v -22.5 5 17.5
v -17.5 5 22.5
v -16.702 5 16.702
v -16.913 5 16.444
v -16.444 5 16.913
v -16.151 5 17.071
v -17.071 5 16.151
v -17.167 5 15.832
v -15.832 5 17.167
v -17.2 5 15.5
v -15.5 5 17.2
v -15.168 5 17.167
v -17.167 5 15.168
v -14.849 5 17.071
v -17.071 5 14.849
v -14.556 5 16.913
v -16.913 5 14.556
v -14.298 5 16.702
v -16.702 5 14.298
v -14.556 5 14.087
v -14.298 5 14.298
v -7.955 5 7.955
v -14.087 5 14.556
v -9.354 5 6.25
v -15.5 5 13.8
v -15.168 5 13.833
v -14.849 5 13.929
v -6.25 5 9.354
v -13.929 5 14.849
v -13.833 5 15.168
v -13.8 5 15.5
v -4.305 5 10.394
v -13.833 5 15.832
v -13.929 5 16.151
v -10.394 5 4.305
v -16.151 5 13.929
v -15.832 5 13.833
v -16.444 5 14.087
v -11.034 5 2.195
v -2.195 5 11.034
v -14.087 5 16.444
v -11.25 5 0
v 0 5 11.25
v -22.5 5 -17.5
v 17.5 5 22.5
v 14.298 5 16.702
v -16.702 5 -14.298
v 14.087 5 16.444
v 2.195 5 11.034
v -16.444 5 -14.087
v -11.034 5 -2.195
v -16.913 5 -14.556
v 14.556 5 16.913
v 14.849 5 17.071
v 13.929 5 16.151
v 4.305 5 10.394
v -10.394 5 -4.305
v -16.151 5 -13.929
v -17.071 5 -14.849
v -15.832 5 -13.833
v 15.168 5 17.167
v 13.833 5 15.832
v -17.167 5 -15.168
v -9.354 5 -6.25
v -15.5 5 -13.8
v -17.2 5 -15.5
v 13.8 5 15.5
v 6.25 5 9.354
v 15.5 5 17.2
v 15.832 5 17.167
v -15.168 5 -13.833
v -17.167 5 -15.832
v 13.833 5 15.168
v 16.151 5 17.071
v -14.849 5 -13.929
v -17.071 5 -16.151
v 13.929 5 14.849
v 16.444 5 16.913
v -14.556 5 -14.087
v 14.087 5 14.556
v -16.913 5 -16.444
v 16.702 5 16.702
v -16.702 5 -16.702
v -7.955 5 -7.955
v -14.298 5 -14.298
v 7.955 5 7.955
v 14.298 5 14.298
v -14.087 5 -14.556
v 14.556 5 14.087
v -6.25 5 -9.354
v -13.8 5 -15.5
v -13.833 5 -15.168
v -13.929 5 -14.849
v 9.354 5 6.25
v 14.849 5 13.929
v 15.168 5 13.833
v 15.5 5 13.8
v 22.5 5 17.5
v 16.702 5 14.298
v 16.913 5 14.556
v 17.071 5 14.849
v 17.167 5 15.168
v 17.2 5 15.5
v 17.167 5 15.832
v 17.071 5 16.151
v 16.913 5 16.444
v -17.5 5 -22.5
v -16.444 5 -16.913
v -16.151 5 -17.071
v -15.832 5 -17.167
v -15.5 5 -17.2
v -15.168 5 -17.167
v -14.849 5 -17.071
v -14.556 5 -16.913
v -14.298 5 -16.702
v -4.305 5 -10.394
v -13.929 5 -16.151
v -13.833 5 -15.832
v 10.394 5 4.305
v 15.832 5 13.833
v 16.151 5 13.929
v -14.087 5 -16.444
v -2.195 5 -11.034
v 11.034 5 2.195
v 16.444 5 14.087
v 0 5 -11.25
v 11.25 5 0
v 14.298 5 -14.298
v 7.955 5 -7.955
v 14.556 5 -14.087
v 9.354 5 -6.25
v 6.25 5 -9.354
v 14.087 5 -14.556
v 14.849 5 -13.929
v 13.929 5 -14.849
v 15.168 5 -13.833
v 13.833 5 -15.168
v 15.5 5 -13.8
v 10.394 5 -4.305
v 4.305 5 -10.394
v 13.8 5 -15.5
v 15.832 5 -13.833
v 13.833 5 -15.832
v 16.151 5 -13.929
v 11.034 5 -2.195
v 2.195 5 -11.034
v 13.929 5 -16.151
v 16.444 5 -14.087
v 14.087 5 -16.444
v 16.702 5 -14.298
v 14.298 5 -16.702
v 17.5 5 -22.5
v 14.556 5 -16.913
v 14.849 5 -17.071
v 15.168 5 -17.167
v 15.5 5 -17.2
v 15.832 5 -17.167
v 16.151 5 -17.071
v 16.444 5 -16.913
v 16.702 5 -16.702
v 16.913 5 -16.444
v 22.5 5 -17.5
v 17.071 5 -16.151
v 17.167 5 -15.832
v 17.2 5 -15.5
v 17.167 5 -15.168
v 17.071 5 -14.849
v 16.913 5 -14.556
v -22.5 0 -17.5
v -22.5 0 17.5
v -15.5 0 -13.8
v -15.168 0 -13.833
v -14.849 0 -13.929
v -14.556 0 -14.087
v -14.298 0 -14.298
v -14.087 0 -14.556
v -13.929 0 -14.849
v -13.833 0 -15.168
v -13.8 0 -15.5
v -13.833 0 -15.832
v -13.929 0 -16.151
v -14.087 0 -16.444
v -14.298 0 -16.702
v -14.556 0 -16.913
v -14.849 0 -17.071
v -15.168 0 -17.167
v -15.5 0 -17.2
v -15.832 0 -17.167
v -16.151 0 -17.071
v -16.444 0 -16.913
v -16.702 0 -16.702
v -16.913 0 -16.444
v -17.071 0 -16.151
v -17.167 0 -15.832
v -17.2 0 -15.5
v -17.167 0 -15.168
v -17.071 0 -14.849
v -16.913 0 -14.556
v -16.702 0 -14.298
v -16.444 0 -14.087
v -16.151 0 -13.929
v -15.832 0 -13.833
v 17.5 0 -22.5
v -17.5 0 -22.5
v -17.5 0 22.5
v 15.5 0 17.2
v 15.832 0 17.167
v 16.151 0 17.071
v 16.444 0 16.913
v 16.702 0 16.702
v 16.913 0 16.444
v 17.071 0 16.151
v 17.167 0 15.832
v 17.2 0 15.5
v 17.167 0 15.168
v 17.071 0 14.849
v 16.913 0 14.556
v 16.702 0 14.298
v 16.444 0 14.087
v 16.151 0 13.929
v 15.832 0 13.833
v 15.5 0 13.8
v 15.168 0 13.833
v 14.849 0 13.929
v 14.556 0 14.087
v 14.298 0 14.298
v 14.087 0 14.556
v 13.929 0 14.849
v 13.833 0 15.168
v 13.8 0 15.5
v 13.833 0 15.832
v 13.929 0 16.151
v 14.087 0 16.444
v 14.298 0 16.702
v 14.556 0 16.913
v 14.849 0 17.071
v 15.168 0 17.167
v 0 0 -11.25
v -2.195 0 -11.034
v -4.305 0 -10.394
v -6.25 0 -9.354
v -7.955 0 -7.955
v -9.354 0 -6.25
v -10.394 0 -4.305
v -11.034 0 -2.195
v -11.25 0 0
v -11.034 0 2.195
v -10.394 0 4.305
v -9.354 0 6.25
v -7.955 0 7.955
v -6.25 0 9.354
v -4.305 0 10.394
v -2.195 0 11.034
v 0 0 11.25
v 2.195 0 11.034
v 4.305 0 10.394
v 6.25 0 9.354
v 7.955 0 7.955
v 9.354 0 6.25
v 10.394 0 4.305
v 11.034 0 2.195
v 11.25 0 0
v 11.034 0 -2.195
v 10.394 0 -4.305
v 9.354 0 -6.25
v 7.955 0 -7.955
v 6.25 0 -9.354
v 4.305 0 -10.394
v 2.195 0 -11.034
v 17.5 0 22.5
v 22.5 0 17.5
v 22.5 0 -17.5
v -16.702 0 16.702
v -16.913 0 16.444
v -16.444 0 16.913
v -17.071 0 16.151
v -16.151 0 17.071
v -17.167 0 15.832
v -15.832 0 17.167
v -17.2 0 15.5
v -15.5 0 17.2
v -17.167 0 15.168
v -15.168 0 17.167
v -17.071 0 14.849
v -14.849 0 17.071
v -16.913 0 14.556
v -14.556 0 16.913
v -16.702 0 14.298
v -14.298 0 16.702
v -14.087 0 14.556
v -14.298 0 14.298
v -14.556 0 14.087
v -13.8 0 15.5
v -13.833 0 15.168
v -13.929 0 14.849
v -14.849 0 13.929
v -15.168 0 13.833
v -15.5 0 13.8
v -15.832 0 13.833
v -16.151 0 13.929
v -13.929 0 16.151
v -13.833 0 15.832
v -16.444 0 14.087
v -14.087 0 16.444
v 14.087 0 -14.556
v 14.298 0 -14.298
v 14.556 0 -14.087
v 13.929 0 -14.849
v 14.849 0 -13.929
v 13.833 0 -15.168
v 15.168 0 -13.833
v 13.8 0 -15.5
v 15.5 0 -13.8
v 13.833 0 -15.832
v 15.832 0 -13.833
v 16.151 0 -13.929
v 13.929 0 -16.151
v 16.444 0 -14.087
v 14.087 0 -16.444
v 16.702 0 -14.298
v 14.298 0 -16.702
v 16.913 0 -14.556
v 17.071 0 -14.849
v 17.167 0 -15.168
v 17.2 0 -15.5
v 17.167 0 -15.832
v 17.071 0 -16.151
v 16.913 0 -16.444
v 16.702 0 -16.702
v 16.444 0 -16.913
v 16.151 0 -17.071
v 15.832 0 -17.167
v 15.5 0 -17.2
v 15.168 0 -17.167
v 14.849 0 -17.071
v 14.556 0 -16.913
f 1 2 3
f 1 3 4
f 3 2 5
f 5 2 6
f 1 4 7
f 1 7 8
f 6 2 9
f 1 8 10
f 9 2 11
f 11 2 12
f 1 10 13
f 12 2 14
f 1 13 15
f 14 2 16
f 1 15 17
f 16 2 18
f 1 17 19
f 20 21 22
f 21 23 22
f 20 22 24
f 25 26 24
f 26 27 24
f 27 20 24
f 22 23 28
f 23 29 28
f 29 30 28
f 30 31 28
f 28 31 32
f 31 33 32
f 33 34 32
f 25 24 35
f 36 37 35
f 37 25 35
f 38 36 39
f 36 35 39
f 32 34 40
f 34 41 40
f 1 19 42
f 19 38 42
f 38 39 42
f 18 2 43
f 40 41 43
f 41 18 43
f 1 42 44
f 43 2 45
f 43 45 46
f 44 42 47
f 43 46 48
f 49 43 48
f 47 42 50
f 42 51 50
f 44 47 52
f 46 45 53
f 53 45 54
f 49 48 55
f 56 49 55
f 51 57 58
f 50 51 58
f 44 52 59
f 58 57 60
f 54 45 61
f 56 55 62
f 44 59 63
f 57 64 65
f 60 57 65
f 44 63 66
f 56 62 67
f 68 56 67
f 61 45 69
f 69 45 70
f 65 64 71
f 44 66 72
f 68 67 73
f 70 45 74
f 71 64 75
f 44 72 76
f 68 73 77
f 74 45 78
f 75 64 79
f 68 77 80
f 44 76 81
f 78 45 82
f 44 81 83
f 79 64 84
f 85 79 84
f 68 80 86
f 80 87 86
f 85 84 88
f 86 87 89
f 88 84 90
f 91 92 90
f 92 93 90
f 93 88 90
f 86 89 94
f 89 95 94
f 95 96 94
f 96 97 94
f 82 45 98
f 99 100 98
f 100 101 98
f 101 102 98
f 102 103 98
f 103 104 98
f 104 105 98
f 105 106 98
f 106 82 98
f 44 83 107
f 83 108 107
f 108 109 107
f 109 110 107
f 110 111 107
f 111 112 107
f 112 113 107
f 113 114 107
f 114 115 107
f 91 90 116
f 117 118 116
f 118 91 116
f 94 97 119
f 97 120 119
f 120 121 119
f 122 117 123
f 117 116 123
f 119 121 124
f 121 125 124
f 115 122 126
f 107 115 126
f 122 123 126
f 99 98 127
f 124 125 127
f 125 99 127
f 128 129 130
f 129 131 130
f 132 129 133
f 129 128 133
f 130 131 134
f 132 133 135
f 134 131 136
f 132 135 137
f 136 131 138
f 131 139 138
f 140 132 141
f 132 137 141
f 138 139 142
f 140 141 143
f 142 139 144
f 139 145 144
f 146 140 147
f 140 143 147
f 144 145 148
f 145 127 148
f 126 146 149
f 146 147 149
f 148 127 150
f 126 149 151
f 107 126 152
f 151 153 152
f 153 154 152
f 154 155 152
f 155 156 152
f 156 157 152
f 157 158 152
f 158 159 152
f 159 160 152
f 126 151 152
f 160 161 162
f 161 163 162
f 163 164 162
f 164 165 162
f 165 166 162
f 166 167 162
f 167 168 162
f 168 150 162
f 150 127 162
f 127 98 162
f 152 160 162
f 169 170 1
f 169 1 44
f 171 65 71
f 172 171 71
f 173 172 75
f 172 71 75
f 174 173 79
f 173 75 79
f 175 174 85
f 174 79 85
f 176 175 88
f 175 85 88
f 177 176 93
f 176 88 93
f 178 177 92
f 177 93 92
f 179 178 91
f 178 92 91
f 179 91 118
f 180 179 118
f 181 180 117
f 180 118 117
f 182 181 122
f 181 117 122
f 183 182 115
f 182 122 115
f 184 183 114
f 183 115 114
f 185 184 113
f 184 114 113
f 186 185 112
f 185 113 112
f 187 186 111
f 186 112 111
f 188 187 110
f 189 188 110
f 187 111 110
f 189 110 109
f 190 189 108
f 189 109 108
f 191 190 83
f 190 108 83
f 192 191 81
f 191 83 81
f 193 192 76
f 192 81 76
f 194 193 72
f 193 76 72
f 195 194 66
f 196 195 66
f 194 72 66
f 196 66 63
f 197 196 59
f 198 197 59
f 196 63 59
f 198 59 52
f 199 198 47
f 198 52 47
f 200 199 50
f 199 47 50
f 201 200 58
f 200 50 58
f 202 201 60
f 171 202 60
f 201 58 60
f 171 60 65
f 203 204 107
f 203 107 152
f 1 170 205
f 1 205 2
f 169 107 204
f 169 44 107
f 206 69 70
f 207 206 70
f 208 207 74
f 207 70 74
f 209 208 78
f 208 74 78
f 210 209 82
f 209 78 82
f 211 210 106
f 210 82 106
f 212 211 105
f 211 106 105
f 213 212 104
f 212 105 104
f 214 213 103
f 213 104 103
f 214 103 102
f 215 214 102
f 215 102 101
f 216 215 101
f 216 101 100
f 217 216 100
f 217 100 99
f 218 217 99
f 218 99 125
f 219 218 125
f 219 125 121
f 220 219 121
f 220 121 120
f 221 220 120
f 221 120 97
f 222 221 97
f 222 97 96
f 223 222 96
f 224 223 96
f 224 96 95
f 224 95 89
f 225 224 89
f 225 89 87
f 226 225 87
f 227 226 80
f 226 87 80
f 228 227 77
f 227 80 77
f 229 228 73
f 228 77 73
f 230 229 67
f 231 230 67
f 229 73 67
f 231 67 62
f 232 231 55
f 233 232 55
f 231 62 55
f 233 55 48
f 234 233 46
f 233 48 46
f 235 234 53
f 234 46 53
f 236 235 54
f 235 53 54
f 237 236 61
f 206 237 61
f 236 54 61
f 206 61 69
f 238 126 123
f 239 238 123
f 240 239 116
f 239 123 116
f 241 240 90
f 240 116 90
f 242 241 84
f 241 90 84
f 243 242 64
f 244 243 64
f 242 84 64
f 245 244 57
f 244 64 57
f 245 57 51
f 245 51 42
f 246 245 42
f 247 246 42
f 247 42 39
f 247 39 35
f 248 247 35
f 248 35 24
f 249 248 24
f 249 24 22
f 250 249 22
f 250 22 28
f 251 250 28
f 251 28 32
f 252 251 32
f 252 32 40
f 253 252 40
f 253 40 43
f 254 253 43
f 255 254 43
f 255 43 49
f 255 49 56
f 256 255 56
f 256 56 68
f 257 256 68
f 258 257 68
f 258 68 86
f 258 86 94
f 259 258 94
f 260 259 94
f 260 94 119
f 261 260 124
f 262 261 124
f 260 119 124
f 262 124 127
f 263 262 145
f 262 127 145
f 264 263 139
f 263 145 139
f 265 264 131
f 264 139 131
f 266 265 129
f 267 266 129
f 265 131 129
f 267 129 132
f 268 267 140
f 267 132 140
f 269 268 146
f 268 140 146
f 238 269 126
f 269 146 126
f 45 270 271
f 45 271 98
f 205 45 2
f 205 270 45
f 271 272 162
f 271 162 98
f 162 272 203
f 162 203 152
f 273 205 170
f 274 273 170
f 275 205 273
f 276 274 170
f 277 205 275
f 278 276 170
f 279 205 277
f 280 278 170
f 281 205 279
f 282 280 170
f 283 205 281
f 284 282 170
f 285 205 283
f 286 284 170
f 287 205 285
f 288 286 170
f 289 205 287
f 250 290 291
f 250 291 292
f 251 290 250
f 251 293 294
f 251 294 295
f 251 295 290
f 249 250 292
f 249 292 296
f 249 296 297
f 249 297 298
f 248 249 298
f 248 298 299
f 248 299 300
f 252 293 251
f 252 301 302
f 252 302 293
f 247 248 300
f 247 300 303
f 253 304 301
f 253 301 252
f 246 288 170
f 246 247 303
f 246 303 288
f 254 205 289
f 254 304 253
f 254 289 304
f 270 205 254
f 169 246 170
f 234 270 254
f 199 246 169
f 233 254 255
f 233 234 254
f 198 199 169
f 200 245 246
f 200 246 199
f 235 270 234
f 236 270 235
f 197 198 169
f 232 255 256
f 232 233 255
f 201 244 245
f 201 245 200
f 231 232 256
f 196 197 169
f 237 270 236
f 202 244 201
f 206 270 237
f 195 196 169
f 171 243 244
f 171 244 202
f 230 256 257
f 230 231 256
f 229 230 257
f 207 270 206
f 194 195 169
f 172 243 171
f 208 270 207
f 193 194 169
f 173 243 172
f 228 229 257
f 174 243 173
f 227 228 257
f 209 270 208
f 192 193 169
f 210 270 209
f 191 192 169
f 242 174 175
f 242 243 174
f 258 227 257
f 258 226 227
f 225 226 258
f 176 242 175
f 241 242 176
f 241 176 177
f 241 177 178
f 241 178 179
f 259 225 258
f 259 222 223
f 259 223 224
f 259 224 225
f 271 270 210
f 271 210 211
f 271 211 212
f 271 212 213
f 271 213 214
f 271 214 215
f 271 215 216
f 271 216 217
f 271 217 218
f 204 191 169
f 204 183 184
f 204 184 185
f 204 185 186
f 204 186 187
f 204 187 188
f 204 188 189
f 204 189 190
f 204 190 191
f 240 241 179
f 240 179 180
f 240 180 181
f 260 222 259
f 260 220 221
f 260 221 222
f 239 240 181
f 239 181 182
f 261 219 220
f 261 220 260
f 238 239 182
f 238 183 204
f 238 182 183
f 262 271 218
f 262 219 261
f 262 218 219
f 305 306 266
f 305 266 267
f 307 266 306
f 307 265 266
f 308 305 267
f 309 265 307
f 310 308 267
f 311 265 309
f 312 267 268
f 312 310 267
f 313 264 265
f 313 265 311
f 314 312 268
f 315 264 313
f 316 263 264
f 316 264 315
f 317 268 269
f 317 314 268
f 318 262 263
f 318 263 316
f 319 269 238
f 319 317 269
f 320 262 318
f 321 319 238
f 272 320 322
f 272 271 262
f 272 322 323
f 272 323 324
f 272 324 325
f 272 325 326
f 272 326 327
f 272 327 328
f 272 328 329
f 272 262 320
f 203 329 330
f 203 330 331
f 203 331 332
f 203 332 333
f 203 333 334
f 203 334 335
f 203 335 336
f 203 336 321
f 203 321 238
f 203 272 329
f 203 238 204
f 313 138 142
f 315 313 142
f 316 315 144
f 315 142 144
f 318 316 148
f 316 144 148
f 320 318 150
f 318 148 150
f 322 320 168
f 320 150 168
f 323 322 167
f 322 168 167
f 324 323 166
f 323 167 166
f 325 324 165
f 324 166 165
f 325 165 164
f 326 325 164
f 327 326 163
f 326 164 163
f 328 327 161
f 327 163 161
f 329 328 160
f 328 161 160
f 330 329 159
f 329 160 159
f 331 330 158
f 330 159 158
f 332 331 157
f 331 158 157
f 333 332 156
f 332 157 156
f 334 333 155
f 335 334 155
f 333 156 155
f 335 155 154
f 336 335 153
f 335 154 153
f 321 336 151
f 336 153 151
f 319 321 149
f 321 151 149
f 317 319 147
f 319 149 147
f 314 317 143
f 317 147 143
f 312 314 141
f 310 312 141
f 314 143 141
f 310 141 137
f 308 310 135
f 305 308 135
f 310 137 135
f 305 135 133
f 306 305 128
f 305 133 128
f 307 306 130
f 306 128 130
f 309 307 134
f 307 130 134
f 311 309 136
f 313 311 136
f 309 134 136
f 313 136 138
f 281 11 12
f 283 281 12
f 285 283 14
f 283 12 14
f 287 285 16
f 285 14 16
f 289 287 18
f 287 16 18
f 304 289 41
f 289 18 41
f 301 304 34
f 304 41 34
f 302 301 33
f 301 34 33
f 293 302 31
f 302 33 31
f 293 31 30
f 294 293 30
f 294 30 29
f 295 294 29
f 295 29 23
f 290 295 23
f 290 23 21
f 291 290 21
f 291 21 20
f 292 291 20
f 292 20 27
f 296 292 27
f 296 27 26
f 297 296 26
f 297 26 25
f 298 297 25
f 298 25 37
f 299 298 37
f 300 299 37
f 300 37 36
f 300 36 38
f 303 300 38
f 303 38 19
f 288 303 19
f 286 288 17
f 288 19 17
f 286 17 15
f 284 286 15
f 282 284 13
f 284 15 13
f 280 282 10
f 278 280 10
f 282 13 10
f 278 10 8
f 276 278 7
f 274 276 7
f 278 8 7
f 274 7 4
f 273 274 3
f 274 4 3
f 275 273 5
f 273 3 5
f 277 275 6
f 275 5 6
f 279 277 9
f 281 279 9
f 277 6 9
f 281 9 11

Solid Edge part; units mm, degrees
sketch "Sketch1" plane through (0, 0, 0) normal (0, -1, 0) x (1, 0, 0)
  line L0 (-22.5, -22.5) -> (22.5, -22.5)
  line L1 (22.5, -22.5) -> (22.5, 22.5)
  line L2 (22.5, 22.5) -> (-22.5, 22.5)
  line L3 (-22.5, 22.5) -> (-22.5, -22.5)
  dimension "D1" = 45
extrude "Protrusion1" add sketch "Sketch1" against normal blind 5
chamfer "Chamfer_1" distance 5 angle 45 4 edges at (22.5, 2.5, 22.5) (22.5, 2.5, -22.5) (-22.5, 2.5, 22.5) (-22.5, 2.5, -22.5)
hole "Hole_1" at (-15.5, 5, 15.5) direction (0, -1, 0) diameter 3.4 end up to next
hole "Hole1" at (-15.5, 5, -15.5) direction (0, -1, 0) diameter 3.4 end up to next
hole "Hole2" at (15.5, 5, -15.5) direction (0, -1, 0) diameter 3.4 end up to next
hole "Hole3" at (15.5, 5, 15.5) direction (0, -1, 0) diameter 3.4 end up to next
sketch "Sketch2" plane through (0, 5, 0) normal (0, 1, 0) x (0, 0, -1)
  circle A0 centre (0, 0) radius 11.25
  dimension "D1" = 22.5
extrude "Cutout1" cut sketch "Sketch2" against normal up to next
properties material "Polyethylene, low density"
